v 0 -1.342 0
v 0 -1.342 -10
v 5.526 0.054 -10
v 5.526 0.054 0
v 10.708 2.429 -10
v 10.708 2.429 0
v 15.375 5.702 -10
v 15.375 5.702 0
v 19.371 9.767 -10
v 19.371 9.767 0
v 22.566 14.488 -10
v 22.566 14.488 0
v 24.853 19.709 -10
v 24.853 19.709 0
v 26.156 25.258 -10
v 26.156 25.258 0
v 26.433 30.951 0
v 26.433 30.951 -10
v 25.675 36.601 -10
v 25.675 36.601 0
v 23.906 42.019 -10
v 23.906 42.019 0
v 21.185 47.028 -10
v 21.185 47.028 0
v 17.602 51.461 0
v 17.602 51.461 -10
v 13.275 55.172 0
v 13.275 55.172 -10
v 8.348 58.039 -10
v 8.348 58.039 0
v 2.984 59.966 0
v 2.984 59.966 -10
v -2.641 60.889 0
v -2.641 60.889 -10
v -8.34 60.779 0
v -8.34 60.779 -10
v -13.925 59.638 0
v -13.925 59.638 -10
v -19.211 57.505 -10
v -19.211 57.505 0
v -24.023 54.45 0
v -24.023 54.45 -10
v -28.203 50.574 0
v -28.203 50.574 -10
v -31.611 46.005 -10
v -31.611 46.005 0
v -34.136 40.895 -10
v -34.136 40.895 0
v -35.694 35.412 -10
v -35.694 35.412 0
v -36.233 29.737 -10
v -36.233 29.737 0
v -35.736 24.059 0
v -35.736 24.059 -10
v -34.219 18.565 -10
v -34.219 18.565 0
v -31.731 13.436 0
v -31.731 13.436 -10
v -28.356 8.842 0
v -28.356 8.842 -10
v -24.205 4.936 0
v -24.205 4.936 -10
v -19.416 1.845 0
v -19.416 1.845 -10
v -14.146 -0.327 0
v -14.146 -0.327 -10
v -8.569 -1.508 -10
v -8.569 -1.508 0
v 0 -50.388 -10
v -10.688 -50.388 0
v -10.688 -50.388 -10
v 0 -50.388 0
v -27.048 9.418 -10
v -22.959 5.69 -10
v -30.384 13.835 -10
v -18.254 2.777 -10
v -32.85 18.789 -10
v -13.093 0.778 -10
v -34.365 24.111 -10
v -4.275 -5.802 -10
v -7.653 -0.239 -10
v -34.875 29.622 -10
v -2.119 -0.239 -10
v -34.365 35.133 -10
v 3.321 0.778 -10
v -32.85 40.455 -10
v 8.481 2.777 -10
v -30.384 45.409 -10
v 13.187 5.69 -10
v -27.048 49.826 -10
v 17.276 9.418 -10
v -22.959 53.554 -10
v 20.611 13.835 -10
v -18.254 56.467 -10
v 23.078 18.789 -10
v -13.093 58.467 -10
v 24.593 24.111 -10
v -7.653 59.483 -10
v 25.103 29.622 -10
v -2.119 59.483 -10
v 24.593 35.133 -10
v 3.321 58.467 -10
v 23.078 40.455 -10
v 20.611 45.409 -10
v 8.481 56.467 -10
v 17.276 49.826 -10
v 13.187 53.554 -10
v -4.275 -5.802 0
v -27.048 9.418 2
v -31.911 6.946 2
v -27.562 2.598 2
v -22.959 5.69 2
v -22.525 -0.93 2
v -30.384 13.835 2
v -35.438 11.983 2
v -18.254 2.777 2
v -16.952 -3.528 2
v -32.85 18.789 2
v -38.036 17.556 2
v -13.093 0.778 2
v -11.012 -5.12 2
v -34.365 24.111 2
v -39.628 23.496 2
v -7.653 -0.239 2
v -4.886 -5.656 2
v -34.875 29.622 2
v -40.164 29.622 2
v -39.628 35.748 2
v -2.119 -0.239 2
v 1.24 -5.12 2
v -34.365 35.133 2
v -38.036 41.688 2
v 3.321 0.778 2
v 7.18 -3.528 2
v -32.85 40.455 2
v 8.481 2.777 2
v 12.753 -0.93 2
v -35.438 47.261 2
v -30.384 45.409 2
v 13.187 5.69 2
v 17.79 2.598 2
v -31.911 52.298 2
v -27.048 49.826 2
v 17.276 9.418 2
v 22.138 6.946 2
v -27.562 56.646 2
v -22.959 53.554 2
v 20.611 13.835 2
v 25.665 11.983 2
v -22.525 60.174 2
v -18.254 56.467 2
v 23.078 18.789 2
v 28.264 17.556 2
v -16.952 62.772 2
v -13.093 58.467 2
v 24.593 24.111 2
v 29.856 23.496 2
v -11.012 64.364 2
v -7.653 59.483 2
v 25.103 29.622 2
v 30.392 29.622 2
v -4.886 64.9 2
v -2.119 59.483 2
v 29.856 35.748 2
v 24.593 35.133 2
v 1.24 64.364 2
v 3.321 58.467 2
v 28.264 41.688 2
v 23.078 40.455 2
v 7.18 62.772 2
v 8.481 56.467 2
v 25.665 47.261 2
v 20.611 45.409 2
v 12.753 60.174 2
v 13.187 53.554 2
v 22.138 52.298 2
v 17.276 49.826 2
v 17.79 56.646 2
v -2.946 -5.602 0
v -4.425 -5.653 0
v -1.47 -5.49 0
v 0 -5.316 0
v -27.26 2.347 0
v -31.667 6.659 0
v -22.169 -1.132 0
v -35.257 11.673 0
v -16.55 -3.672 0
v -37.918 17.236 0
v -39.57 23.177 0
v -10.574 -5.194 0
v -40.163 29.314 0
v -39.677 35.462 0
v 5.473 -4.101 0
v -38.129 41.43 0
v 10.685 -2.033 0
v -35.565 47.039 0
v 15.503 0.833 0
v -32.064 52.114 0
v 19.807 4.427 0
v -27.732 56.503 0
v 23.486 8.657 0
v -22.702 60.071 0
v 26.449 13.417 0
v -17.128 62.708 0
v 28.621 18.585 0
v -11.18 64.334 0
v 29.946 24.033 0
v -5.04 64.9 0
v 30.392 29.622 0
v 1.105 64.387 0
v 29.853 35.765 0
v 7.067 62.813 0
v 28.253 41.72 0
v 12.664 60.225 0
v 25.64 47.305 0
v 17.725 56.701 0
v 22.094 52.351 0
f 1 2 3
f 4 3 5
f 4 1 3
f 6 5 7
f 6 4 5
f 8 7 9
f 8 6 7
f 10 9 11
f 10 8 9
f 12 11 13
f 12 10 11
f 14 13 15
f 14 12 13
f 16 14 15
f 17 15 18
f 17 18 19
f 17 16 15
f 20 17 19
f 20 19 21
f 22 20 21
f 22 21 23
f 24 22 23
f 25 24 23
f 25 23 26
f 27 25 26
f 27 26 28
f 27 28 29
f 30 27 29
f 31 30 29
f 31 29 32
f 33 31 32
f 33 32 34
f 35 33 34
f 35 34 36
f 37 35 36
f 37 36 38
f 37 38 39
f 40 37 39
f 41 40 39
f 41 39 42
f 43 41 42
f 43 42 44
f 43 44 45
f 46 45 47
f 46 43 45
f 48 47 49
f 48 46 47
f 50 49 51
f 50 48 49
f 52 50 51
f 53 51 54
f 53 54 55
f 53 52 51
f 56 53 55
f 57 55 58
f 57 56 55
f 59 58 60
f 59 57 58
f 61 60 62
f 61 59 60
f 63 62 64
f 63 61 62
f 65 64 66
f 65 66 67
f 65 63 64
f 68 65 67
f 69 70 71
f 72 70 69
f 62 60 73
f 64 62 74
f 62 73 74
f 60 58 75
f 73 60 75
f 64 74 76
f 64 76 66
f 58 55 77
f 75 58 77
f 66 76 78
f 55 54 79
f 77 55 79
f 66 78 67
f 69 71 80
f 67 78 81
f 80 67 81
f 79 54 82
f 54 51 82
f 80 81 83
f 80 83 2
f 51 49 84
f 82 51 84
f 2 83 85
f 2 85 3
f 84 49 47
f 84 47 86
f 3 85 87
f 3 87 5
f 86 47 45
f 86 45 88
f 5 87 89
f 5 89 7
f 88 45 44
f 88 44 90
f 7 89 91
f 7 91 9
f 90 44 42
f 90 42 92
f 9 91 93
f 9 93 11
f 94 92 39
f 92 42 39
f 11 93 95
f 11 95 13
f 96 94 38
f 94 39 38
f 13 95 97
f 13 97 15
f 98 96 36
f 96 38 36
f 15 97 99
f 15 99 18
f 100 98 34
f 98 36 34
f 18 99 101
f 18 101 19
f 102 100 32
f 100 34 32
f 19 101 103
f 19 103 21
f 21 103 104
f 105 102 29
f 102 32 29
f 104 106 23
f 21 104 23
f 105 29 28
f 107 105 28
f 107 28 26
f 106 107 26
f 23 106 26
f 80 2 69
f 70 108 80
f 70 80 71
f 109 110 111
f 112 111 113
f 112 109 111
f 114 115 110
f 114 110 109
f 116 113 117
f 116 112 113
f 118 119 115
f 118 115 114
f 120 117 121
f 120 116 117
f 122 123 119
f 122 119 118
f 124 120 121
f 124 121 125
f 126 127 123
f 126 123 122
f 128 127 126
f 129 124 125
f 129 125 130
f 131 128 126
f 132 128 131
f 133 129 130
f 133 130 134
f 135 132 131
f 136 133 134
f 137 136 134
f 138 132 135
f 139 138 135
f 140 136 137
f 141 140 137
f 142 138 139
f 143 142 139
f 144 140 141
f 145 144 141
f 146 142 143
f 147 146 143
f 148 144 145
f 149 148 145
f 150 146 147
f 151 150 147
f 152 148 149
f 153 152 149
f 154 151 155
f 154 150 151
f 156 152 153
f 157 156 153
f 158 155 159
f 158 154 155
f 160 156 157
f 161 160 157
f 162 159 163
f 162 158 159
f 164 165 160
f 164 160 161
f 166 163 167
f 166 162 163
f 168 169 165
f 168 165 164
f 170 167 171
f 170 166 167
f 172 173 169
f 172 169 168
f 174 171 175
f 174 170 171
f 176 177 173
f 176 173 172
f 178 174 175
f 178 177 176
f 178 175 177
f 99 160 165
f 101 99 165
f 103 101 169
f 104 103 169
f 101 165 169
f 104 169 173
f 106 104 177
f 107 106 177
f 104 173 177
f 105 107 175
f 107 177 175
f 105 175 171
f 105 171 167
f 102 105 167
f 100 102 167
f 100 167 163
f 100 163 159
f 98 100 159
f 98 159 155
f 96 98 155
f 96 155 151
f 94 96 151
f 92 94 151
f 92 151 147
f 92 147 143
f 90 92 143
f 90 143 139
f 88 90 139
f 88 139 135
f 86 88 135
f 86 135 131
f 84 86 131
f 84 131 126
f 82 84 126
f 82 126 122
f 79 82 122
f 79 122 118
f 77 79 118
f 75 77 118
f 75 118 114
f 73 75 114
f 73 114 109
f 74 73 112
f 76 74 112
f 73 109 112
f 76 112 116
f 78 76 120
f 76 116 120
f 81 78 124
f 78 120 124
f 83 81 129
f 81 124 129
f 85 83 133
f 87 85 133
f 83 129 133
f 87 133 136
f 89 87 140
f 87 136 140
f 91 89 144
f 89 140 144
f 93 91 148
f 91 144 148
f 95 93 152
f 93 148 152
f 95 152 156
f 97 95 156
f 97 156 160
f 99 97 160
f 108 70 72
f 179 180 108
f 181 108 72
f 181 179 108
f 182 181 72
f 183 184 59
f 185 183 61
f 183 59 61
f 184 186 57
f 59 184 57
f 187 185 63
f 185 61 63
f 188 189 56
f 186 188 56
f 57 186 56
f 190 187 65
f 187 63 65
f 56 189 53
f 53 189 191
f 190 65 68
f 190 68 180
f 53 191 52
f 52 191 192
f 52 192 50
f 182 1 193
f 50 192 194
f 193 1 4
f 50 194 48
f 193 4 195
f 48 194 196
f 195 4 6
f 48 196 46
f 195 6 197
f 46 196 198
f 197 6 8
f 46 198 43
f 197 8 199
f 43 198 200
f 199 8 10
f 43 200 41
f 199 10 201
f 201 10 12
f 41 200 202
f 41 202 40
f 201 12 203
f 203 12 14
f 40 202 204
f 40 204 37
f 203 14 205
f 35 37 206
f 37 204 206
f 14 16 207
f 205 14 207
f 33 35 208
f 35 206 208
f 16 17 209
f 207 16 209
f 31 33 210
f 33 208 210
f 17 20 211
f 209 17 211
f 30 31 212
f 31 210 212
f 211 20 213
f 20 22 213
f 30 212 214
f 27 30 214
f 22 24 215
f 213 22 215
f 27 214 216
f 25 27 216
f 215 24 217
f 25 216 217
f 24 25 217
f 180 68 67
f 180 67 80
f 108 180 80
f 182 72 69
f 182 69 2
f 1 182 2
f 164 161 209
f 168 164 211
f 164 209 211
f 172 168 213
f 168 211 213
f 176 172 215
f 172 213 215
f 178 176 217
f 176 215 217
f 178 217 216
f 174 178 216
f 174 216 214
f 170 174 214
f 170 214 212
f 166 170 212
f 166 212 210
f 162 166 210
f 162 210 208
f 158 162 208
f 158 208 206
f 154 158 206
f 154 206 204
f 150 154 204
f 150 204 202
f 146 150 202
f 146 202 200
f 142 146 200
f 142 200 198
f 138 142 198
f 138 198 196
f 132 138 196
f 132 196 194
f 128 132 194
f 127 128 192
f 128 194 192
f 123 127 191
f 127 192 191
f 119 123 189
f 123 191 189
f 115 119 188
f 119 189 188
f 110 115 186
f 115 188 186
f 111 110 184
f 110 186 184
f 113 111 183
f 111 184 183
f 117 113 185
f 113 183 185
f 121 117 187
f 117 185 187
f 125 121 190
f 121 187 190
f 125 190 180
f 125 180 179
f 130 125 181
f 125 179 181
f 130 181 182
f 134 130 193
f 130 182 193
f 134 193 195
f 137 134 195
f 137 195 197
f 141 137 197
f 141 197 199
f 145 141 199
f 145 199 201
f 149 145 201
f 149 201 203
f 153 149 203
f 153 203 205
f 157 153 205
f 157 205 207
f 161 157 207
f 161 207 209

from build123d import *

# Parameters (mm, degrees)
F1_DEPTH = 10
F2_R     = 31.347396
F3_DEPTH = 10
F4_R     = 35.277865
F5_DEPTH = 2
F6_R     = 29.989336
F7_DEPTH = 25


with BuildPart() as f1:
    # F0 (on Top) → F1 (new body)
    with BuildSketch(Plane.XY):
        Polygon((0, 0), (-10.077596, 0), (-4.275343, -5.802252), (-10.688359, -50.387979), (0, -50.387979), align=None)
    extrude(amount=-F1_DEPTH)

    # F2 (on Top) → F3 (join)
    with BuildSketch(Plane.XY):
        with Locations((-4.886107, 29.622024)):
            Circle(F2_R)
    extrude(amount=-F3_DEPTH)

    # F4 (on face) → F5 (join)
    with BuildSketch(Plane.XY):
        with Locations((-4.886107, 29.622024)):
            Circle(F4_R)
    extrude(amount=F5_DEPTH)

    # F6 (on face) → F7 (cut)
    with BuildSketch(Plane.XY.offset(2)):
        with Locations((-4.886107, 29.622024)):
            Circle(F6_R)
    extrude(amount=-F7_DEPTH, mode=Mode.SUBTRACT)


solid = f1.part
